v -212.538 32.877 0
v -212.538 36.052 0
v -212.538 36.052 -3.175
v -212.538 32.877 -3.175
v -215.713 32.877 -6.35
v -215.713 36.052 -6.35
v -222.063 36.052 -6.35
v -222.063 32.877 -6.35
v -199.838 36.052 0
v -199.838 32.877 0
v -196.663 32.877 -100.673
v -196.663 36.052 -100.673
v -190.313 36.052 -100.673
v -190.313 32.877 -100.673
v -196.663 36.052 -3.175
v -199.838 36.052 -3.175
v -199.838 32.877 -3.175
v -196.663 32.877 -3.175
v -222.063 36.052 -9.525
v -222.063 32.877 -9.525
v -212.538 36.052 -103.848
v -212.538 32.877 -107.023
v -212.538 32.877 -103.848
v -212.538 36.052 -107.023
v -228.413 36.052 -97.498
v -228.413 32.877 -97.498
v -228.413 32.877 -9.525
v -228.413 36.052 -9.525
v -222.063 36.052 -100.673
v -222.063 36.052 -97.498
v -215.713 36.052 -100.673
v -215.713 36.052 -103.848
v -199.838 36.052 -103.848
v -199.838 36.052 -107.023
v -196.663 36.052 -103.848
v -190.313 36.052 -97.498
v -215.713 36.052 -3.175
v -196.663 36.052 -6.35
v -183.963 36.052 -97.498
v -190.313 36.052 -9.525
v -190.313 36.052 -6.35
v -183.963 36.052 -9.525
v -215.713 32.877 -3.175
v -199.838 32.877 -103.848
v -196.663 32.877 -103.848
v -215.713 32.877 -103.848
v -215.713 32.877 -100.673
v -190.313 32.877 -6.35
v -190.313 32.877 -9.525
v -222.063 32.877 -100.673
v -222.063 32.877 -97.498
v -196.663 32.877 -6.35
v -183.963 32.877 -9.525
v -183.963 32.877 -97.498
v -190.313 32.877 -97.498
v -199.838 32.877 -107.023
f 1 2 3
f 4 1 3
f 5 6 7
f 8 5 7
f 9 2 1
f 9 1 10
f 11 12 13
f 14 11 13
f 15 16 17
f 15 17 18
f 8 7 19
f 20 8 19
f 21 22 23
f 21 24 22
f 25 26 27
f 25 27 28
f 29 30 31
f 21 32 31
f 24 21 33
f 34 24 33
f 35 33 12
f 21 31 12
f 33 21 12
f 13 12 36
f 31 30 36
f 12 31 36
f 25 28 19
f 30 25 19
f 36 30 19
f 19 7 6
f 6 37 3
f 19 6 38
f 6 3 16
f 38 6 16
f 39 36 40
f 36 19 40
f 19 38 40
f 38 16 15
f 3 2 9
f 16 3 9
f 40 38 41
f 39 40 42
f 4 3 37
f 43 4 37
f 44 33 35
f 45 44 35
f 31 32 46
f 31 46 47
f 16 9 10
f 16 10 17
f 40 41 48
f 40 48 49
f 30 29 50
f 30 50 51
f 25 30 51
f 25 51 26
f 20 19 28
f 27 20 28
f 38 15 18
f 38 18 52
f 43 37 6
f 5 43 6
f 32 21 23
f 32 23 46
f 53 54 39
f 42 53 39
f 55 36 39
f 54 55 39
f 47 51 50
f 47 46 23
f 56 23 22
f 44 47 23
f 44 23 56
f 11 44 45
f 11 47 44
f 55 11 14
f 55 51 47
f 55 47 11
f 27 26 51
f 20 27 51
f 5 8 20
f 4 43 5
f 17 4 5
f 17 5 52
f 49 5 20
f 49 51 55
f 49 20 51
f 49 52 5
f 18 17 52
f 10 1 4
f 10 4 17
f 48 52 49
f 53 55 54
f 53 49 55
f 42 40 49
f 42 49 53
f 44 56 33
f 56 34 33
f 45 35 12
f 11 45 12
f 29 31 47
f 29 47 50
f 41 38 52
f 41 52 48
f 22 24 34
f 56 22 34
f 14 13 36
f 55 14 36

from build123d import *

# Parameters (mm, degrees)
SKETCH1_W           = 44.45
SKETCH1_H           = 3.175
BOSS_EXTRUDE1_DEPTH = 107.022511
CUT_EXTRUDE1_DEPTH  = 253.262317967


with BuildPart() as part:
    # Sketch1 → Boss-Extrude1 (new body)
    with BuildSketch(Plane.XY):
        with Locations((-206.187737343, 34.464226646)):
            Rectangle(SKETCH1_W, SKETCH1_H)
    extrude(amount=-BOSS_EXTRUDE1_DEPTH)

    # Sketch2 → Cut-Extrude1 (cut, through all)
    with BuildSketch(Plane(origin=(0, 36.051726646, 0), x_dir=(1, 0, 0), z_dir=(0, 1, 0))):
        Polygon((-228.412737343, 107.022511379), (-222.062737343, 107.022511379), (-215.712737343, 107.022511379), (-212.537737343, 107.022511379), (-212.537737343, 103.847511379), (-215.712737343, 103.847511379), (-215.712737343, 100.672511379), (-222.062737343, 100.672511379), (-222.062737343, 97.497511379), (-228.412737343, 97.497511379), align=None)
        Polygon((-183.962737343, 107.022511379), (-190.312737343, 107.022511379), (-196.662737343, 107.022511379), (-199.837737343, 107.022511379), (-199.837737343, 103.847511379), (-196.662737343, 103.847511379), (-196.662737343, 100.672511379), (-190.312737343, 100.672511379), (-190.312737343, 97.497511379), (-183.962737343, 97.497511379), align=None)
        Polygon((-228.412737343, 0), (-222.062737343, 0), (-215.712737343, 0), (-212.537737343, 0), (-212.537737343, 3.175), (-215.712737343, 3.175), (-215.712737343, 6.35), (-222.062737343, 6.35), (-222.062737343, 9.525), (-228.412737343, 9.525), align=None)
        Polygon((-183.962737343, 0), (-190.312737343, 0), (-196.662737343, 0), (-199.837737343, 0), (-199.837737343, 3.175), (-196.662737343, 3.175), (-196.662737343, 6.35), (-190.312737343, 6.35), (-190.312737343, 9.525), (-183.962737343, 9.525), align=None)
    extrude(amount=-CUT_EXTRUDE1_DEPTH, mode=Mode.SUBTRACT)


solid = part.part
